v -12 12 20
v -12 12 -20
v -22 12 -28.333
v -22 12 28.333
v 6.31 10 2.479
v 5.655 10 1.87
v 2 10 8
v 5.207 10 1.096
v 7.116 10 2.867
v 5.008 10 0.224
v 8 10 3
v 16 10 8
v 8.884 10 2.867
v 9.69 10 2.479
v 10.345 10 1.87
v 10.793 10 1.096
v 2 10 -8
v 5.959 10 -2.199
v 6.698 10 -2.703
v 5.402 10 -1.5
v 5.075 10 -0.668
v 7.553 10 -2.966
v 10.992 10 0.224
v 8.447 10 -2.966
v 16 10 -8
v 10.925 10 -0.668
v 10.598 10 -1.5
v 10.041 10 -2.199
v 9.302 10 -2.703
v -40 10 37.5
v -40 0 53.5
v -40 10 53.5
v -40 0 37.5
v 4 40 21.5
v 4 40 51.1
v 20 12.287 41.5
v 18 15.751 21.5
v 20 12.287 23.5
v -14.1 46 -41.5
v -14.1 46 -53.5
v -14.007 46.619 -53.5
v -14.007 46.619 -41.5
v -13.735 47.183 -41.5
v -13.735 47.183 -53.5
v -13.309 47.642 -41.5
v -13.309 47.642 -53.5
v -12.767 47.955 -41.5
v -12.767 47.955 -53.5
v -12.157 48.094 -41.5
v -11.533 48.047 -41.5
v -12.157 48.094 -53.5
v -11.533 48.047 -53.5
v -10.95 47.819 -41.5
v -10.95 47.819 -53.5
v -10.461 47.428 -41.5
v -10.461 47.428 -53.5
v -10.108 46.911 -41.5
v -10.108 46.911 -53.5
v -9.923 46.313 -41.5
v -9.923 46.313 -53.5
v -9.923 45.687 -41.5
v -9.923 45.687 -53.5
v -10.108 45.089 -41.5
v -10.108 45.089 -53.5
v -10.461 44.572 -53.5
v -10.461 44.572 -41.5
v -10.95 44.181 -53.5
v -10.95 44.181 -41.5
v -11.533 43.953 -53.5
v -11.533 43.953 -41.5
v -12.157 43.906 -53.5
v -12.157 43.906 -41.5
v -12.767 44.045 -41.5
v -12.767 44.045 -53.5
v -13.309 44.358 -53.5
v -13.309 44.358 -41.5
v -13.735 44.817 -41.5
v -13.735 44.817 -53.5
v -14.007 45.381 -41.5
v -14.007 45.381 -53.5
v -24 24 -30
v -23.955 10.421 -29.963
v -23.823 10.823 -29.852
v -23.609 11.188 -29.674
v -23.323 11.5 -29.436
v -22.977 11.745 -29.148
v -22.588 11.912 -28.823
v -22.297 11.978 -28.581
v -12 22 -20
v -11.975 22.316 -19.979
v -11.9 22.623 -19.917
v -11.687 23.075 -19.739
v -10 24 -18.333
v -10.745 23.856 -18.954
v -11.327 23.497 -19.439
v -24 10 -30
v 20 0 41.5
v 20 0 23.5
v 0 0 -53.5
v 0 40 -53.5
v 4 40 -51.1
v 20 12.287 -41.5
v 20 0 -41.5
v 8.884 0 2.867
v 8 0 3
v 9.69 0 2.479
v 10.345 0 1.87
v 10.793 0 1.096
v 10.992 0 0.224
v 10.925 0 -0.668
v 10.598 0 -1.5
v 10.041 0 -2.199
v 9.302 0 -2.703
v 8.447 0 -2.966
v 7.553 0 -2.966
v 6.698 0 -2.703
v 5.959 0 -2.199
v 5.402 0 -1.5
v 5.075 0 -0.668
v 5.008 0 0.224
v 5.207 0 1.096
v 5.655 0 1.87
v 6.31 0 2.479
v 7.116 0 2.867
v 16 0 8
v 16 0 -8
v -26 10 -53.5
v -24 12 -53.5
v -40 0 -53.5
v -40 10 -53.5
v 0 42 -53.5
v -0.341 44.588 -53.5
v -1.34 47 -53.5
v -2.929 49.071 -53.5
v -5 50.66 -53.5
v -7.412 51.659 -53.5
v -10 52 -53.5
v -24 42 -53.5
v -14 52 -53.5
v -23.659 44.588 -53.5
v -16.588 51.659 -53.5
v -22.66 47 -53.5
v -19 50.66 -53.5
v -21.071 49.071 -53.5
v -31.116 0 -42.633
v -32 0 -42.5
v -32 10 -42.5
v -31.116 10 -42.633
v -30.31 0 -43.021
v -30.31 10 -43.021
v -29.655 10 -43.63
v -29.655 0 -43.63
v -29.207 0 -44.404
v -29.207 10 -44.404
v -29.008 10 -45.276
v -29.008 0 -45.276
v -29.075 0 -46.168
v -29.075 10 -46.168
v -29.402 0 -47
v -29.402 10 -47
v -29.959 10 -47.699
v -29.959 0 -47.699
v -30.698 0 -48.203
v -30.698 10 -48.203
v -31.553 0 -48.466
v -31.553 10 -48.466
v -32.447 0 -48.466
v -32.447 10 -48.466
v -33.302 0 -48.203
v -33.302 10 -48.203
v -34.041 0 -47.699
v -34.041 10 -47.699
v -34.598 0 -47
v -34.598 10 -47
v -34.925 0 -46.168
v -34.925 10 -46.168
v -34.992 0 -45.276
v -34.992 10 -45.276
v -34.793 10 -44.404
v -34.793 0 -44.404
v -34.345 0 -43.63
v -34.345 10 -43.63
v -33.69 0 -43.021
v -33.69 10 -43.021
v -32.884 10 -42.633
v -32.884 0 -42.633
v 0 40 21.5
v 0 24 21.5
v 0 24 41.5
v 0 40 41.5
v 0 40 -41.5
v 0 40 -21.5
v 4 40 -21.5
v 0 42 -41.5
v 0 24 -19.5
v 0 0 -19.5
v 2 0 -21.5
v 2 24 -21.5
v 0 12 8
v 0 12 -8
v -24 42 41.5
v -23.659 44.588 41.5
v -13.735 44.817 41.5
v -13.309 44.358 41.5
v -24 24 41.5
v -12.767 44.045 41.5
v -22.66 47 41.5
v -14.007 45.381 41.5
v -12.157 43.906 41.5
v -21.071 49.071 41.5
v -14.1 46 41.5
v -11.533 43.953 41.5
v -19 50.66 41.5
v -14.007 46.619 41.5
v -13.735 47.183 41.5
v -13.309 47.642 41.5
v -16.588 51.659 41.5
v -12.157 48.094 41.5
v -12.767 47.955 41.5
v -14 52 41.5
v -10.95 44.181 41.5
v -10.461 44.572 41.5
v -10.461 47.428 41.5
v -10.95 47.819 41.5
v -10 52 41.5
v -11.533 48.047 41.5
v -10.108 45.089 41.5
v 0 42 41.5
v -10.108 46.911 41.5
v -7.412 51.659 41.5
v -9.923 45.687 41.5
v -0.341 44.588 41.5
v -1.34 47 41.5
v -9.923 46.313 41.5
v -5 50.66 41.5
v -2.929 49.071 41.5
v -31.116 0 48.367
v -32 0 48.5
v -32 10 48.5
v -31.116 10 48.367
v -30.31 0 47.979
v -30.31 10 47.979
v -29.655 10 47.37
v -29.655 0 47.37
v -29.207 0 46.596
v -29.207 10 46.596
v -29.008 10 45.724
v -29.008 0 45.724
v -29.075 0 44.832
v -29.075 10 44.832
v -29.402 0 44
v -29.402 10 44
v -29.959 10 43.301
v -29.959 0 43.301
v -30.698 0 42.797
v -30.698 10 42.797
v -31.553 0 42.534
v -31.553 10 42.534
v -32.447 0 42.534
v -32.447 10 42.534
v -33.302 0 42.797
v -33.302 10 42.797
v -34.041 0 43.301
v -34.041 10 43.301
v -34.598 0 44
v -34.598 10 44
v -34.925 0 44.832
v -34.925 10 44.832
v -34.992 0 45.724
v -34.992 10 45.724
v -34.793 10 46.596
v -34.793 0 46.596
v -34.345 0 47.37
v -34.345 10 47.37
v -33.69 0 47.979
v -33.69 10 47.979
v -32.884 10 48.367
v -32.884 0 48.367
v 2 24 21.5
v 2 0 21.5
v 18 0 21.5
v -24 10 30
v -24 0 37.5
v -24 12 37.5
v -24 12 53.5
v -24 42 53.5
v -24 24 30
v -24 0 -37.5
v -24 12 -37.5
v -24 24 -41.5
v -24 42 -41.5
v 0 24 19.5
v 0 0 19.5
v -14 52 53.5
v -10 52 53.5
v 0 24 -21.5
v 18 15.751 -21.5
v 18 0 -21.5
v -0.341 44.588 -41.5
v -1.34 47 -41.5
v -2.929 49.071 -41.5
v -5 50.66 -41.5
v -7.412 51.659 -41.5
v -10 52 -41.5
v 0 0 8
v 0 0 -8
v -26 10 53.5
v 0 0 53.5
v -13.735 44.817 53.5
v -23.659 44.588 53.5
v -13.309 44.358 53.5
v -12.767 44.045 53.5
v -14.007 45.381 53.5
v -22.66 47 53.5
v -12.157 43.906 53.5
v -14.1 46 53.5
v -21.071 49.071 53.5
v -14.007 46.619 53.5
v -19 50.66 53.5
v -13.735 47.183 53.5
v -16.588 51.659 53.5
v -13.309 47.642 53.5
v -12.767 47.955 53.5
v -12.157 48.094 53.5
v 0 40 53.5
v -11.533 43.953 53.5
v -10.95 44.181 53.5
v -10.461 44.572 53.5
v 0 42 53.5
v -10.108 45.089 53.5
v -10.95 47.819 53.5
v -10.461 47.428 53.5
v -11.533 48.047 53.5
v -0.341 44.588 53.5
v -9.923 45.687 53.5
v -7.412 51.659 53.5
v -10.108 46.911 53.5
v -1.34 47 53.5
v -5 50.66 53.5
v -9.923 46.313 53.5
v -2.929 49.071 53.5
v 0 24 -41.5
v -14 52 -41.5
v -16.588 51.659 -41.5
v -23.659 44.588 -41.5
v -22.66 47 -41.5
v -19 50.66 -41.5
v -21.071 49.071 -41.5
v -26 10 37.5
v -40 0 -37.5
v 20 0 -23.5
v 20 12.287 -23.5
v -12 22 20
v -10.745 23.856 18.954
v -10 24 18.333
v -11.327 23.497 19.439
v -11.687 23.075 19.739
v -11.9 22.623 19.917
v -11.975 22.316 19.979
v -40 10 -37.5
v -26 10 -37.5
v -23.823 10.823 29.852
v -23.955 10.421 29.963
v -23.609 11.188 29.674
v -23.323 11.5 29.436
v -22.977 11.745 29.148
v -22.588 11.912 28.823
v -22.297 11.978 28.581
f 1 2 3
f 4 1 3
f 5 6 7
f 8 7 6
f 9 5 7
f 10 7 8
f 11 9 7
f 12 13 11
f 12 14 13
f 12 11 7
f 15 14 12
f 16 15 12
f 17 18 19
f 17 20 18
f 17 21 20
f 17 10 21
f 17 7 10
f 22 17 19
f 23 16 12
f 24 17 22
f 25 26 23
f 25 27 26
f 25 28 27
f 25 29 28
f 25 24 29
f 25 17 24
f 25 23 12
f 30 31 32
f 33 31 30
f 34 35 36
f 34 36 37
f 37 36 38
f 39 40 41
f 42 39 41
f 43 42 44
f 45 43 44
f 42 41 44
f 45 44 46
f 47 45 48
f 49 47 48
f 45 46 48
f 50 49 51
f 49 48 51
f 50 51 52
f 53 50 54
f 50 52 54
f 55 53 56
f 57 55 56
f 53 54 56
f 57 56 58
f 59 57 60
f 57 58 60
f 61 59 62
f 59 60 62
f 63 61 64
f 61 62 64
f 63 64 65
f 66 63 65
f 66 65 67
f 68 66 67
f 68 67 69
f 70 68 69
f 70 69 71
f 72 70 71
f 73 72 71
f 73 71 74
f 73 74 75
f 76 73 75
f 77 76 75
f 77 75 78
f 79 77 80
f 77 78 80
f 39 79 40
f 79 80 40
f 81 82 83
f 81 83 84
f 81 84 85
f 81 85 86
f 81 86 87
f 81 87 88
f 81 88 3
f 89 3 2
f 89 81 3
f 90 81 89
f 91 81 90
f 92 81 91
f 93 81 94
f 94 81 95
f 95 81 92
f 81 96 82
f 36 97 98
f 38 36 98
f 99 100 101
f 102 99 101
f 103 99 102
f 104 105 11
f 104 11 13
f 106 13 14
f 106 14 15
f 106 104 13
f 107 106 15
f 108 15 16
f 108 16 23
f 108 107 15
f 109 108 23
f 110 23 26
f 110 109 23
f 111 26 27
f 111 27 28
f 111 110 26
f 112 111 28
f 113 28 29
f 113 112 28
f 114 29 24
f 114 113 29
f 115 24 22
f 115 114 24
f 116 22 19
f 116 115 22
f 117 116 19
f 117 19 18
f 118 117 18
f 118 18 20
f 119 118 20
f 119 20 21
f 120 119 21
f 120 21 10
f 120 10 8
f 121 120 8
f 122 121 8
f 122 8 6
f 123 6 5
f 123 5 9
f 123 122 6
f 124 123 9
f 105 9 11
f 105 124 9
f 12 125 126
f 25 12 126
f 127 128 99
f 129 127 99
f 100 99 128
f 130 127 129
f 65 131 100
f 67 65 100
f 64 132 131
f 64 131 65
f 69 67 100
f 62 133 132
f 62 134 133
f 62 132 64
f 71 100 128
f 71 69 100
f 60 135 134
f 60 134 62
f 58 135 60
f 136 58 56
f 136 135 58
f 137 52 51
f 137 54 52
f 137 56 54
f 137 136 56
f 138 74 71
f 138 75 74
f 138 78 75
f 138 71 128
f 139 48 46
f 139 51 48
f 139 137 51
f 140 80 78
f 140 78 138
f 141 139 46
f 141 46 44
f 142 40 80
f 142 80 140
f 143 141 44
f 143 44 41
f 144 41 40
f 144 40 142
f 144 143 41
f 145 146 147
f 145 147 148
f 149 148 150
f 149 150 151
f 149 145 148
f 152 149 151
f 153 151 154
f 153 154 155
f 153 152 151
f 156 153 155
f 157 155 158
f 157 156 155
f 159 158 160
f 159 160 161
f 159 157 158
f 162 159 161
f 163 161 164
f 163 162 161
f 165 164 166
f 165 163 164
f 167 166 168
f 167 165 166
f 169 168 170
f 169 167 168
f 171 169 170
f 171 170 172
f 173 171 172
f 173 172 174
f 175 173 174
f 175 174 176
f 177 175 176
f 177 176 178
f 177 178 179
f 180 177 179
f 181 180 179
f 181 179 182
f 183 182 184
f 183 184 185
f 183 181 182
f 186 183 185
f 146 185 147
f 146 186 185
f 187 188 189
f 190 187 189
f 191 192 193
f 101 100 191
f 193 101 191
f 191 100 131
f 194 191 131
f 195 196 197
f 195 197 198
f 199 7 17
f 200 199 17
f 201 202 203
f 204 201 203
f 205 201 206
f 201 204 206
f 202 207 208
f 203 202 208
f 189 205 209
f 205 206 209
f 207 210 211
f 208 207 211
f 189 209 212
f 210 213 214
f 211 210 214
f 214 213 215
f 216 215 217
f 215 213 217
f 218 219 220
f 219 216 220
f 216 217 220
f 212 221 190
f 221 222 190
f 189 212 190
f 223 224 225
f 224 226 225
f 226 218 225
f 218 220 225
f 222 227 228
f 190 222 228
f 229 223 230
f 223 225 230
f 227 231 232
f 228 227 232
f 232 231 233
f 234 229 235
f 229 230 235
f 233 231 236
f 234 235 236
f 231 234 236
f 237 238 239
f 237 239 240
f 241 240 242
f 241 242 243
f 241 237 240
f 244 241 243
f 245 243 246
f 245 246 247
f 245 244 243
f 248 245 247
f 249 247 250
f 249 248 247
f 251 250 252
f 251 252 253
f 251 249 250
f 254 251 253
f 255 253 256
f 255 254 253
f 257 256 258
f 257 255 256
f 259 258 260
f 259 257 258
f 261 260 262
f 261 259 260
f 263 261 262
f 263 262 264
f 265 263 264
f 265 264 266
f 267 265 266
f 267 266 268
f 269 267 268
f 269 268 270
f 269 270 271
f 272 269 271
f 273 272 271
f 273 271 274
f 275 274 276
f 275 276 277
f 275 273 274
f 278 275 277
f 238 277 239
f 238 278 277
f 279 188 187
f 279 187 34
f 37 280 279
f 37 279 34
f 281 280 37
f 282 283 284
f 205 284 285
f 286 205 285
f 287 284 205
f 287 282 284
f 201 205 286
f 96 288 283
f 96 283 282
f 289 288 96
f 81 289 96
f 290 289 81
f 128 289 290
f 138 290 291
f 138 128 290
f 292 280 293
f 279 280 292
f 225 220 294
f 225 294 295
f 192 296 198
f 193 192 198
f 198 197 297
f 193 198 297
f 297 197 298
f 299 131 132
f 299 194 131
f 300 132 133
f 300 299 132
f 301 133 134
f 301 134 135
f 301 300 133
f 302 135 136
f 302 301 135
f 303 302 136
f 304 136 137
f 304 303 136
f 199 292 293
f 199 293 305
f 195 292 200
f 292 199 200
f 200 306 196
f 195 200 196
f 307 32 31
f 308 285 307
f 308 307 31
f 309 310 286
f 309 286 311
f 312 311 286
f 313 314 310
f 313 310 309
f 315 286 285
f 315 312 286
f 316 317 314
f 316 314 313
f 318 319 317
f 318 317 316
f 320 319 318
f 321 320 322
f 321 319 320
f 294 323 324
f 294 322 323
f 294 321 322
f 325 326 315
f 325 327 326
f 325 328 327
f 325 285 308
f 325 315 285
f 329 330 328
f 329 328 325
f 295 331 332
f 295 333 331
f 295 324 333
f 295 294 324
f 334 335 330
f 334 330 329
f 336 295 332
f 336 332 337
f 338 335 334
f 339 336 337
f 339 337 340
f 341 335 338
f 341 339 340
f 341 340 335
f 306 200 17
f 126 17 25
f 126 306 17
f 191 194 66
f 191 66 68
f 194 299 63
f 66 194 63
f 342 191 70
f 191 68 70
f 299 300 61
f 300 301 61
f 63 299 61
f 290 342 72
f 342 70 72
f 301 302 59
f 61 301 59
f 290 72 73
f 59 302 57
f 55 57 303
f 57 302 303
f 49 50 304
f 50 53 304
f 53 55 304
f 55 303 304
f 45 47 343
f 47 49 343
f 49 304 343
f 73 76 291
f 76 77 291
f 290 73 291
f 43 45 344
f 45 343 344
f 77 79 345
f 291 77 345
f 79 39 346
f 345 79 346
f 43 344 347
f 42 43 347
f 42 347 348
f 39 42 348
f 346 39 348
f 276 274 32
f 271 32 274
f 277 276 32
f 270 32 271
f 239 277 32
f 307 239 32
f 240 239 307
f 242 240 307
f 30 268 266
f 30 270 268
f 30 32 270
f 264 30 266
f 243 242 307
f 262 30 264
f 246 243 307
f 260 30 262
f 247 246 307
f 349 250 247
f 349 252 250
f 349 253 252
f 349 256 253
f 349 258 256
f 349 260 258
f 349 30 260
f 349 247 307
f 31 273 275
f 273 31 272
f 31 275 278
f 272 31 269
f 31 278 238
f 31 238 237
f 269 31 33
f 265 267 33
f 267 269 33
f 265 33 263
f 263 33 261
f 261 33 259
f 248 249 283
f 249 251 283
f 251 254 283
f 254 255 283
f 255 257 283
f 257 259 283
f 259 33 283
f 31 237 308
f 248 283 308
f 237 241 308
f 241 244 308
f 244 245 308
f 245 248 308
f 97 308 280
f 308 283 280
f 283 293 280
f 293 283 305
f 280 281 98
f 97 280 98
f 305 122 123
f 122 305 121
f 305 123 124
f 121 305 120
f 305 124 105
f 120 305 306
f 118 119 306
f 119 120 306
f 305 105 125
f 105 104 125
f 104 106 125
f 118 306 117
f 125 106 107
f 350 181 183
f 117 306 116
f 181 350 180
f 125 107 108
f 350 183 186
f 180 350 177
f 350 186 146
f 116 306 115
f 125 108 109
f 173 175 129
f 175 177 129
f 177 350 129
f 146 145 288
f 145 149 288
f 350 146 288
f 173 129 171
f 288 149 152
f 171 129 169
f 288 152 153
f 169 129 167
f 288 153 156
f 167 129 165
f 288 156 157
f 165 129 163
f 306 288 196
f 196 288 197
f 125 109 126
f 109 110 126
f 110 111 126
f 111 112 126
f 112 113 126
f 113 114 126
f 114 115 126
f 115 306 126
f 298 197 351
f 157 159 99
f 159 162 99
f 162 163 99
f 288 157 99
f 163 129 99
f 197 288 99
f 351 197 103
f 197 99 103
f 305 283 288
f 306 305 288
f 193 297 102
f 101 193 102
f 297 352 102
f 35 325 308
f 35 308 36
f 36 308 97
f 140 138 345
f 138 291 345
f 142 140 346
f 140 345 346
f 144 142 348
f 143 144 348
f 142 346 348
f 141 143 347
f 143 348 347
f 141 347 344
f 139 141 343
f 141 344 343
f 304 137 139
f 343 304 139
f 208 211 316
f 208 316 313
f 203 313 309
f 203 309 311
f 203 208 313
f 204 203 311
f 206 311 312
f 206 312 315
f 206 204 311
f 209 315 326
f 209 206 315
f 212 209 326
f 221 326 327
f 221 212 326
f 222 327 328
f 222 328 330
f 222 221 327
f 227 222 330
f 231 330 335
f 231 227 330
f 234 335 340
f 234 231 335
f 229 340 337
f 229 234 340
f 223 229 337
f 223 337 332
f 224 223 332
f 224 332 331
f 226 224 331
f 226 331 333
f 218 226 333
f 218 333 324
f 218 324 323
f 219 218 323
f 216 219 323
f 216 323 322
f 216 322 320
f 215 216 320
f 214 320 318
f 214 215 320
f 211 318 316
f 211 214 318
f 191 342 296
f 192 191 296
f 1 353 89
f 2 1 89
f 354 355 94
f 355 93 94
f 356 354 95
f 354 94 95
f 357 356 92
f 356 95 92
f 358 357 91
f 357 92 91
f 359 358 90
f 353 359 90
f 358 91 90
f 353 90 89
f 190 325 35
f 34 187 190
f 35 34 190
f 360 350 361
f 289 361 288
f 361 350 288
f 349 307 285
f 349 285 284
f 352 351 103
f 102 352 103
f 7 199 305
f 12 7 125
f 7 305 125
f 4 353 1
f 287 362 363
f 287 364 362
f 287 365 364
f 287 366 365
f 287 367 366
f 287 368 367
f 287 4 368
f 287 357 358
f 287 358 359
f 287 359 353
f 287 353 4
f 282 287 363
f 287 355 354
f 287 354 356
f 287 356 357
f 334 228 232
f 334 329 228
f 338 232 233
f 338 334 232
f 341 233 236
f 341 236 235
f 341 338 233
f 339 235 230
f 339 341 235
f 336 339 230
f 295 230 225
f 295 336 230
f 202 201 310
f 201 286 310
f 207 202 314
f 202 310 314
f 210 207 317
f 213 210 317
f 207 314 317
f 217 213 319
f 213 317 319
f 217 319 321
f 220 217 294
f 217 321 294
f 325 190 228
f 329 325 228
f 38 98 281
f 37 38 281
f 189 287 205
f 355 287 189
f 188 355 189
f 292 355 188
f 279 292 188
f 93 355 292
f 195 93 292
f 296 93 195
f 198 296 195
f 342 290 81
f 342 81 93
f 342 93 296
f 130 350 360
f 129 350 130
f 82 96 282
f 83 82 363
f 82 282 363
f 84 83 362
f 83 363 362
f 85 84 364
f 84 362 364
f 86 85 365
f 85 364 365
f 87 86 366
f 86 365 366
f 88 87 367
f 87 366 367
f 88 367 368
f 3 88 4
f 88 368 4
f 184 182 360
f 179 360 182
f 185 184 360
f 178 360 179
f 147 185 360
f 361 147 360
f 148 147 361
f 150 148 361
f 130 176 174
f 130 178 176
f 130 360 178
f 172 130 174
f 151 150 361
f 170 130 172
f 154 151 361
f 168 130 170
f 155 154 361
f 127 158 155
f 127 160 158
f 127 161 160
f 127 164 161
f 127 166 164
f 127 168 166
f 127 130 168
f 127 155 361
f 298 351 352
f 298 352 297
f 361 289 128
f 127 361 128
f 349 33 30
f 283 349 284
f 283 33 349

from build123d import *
from OCP.BRepFilletAPI import BRepFilletAPI_MakeChamfer

# Parameters (mm, degrees)
SKETCH_1_W          = 24
SKETCH_1_H          = 107
EXTRUDE_1_DEPTH     = 15
EXTRUDE_2_DEPTH     = 9
SKETCH_3_W          = 20
SKETCH_3_H          = 20
EXTRUDE_4_DEPTH     = 40
SKETCH_4_W          = 24
SKETCH_4_H          = 12
EXTRUDE_6_DEPTH     = 25
CHAMFER_2_SIZE      = 2
SKETCH_5_W          = 16
SKETCH_5_H          = 16
SKETCH_5_R          = 3
EXTRUDE_7_DEPTH     = 10
CHAMFER_3_SIZE      = 2
SKETCH_6_W          = 24
SKETCH_6_H          = 12
SKETCH_6_R          = 2.1
EXTRUDE_8_DEPTH     = 12
EXTRUDE_START       = -12
SKETCH_7_W          = 24
SKETCH_7_H          = 12
SKETCH_7_R          = 2.1
EXTRUDE_9_DEPTH     = 12
FILLET_1_R          = 10
CHAMFER_4_SIZE      = 16
CHAMFER_4_SIZE2     = 27.712812921
CUT_EXTRUDE_1_DEPTH = 12
FILLET_2_R          = 2


with BuildPart() as part:
    # Эскиз1 → Бобышка-Вытянуть1 (new body)
    with BuildSketch(Plane(origin=(0, 0, 0), x_dir=(1, 0, 0), z_dir=(0, 1, 0))):
        with Locations((-12, 0)):
            Rectangle(SKETCH_1_W, SKETCH_1_H)
    extrude(amount=EXTRUDE_1_DEPTH)

    # Эскиз2 → Бобышка-Вытянуть2 (add)
    with BuildSketch(Plane(origin=(0, 15, 0), x_dir=(1, 0, 0), z_dir=(0, 1, 0))):
        Polygon((0, 0), (0, 41.5), (-24, 41.5), (-24, -41.5), (0, -41.5), align=None)
    extrude(amount=EXTRUDE_2_DEPTH)

    # Эскиз3 → Бобышка-Вытянуть4 (add)
    with BuildSketch(Plane(origin=(0, 0, 0), x_dir=(1, 0, 0), z_dir=(0, 1, 0))):
        Polygon((0, 53.5), (20, 41.5), (0, 41.5), align=None)
        with Locations((10, 31.5)):
            Rectangle(SKETCH_3_W, SKETCH_3_H)
        with Locations((10, -31.5)):
            Rectangle(SKETCH_3_W, SKETCH_3_H)
        Polygon((0, -41.5), (0, -53.5), (20, -41.5), align=None)
    extrude(amount=EXTRUDE_4_DEPTH)

    # Эскиз4 → Бобышка-Вытянуть6 (add)
    with BuildSketch(Plane(origin=(0, 15, 0), x_dir=(1, 0, 0), z_dir=(0, 1, 0))):
        with Locations((-12, 47.5)):
            Rectangle(SKETCH_4_W, SKETCH_4_H)
        with Locations((-12, -47.5)):
            Rectangle(SKETCH_4_W, SKETCH_4_H)
    extrude(amount=EXTRUDE_6_DEPTH)

    # Фаска2
    chamfer_2_edges = [part.edges().sort_by_distance(p)[0] for p in [
        (0, 12, -21.5),
        (20, 20, -21.5),
        (0, 12, 21.5),
        (20, 20, 21.5),
    ]]
    chamfer(chamfer_2_edges, length=CHAMFER_2_SIZE)

    # Эскиз5 → Бобышка-Вытянуть7 (add)
    # profile 1 of 3: a face of its own
    with BuildSketch(Plane(origin=(0, 0, 0), x_dir=(1, 0, 0), z_dir=(0, 1, 0))):
        with Locations((-32, 45.5)):
            Rectangle(SKETCH_5_W, SKETCH_5_H)
        with Locations(Location((-32, 45.5, 0), (0, 0, 270))):
            Circle(SKETCH_5_R, mode=Mode.SUBTRACT)
    # profile 2 of 3: a face of its own
    with BuildSketch(Plane(origin=(0, 0, 0), x_dir=(1, 0, 0), z_dir=(0, 1, 0))):
        with Locations((-32, -45.5)):
            Rectangle(SKETCH_5_W, SKETCH_5_H)
        with Locations(Location((-32, -45.5, 0), (0, 0, 270))):
            Circle(SKETCH_5_R, mode=Mode.SUBTRACT)
    # profile 3 of 3: a face of its own
    with BuildSketch(Plane(origin=(0, 0, 0), x_dir=(1, 0, 0), z_dir=(0, 1, 0))):
        with Locations((8, 0)):
            Rectangle(SKETCH_5_W, SKETCH_5_H)
        with Locations(Location((8, 0, 0), (0, 0, 270))):
            Circle(SKETCH_5_R, mode=Mode.SUBTRACT)
    extrude(amount=EXTRUDE_7_DEPTH)

    # Фаска3
    chamfer_3_edges = [part.edges().sort_by_distance(p)[0] for p in [
        (-24, 10, -45.5),
        (-24, 10, 45.5),
        (0, 10, 0),
    ]]
    chamfer(chamfer_3_edges, length=CHAMFER_3_SIZE)

    # Эскиз6 → Бобышка-Вытянуть8 (add)
    with BuildSketch(Plane(origin=(0, 0, -53.5), x_dir=(-1, 0, 0), z_dir=(0, 0, -1))):
        with Locations((12, 46)):
            Rectangle(SKETCH_6_W, SKETCH_6_H)
        with Locations((12, 46)):
            Circle(SKETCH_6_R, mode=Mode.SUBTRACT)
    extrude(amount=-EXTRUDE_8_DEPTH)

    # Эскиз7 → Бобышка-Вытянуть9 (add)
    with BuildSketch(Plane.XY.offset(53.5).offset(EXTRUDE_START)):
        with Locations((-12, 46)):
            Rectangle(SKETCH_7_W, SKETCH_7_H)
        with Locations(Location((-12, 46, 0), (0, 0, 180))):
            Circle(SKETCH_7_R, mode=Mode.SUBTRACT)
    extrude(amount=EXTRUDE_9_DEPTH)

    # Скругление1
    fillet_1_edges = [part.edges().sort_by_distance(p)[0] for p in [
        (0, 52, -47.5),
        (-24, 52, -47.5),
        (-24, 52, 47.5),
        (0, 52, 47.5),
    ]]
    fillet(fillet_1_edges, radius=FILLET_1_R)

    # Фаска4: one chamfer whose edges measure the first distance from different faces: ONE call of the kernel's chamfer builder (chamfer() names one face for all edges)
    chamfer_4_edges_1 = [part.edges().sort_by_distance(p)[0] for p in [
        (20, 40, 32.5),
    ]]
    chamfer_4_side_1 = [part.faces().sort_by_distance(p)[0] for p in [
        (9.191763192, 40, 34.779279279),
    ]]
    chamfer_4_edges_2 = [part.edges().sort_by_distance(p)[0] for p in [
        (20, 40, -32.5),
    ]]
    chamfer_4_side_2 = [part.faces().sort_by_distance(p)[0] for p in [
        (9.191763192, 40, -34.779279279),
    ]]
    chamfer_4 = BRepFilletAPI_MakeChamfer(part.part.solid().wrapped)
    for e in chamfer_4_edges_1:
        chamfer_4.Add(CHAMFER_4_SIZE, CHAMFER_4_SIZE2, e.wrapped, chamfer_4_side_1[0].wrapped)  # the first distance lies on this face
    for e in chamfer_4_edges_2:
        chamfer_4.Add(CHAMFER_4_SIZE, CHAMFER_4_SIZE2, e.wrapped, chamfer_4_side_2[0].wrapped)  # the first distance lies on this face
    add(Compound.cast(chamfer_4.Shape()), mode=Mode.REPLACE)

    # Эскиз8 → Вырез-Вытянуть1 (cut)
    with BuildSketch(Plane(origin=(0, 24, 0), x_dir=(1, 0, 0), z_dir=(0, 1, 0))):
        Polygon((-24, 0), (-24, 30), (-12, 20), (-12, 0), (-12, -20), (-24, -30), align=None)
    extrude(amount=-CUT_EXTRUDE_1_DEPTH, mode=Mode.SUBTRACT)

    # Скругление2
    fillet_2_edges = [part.edges().sort_by_distance(p)[0] for p in [
        (-24, 12, 0),
        (-12, 24, 0),
    ]]
    fillet(fillet_2_edges, radius=FILLET_2_R)


solid = part.part
